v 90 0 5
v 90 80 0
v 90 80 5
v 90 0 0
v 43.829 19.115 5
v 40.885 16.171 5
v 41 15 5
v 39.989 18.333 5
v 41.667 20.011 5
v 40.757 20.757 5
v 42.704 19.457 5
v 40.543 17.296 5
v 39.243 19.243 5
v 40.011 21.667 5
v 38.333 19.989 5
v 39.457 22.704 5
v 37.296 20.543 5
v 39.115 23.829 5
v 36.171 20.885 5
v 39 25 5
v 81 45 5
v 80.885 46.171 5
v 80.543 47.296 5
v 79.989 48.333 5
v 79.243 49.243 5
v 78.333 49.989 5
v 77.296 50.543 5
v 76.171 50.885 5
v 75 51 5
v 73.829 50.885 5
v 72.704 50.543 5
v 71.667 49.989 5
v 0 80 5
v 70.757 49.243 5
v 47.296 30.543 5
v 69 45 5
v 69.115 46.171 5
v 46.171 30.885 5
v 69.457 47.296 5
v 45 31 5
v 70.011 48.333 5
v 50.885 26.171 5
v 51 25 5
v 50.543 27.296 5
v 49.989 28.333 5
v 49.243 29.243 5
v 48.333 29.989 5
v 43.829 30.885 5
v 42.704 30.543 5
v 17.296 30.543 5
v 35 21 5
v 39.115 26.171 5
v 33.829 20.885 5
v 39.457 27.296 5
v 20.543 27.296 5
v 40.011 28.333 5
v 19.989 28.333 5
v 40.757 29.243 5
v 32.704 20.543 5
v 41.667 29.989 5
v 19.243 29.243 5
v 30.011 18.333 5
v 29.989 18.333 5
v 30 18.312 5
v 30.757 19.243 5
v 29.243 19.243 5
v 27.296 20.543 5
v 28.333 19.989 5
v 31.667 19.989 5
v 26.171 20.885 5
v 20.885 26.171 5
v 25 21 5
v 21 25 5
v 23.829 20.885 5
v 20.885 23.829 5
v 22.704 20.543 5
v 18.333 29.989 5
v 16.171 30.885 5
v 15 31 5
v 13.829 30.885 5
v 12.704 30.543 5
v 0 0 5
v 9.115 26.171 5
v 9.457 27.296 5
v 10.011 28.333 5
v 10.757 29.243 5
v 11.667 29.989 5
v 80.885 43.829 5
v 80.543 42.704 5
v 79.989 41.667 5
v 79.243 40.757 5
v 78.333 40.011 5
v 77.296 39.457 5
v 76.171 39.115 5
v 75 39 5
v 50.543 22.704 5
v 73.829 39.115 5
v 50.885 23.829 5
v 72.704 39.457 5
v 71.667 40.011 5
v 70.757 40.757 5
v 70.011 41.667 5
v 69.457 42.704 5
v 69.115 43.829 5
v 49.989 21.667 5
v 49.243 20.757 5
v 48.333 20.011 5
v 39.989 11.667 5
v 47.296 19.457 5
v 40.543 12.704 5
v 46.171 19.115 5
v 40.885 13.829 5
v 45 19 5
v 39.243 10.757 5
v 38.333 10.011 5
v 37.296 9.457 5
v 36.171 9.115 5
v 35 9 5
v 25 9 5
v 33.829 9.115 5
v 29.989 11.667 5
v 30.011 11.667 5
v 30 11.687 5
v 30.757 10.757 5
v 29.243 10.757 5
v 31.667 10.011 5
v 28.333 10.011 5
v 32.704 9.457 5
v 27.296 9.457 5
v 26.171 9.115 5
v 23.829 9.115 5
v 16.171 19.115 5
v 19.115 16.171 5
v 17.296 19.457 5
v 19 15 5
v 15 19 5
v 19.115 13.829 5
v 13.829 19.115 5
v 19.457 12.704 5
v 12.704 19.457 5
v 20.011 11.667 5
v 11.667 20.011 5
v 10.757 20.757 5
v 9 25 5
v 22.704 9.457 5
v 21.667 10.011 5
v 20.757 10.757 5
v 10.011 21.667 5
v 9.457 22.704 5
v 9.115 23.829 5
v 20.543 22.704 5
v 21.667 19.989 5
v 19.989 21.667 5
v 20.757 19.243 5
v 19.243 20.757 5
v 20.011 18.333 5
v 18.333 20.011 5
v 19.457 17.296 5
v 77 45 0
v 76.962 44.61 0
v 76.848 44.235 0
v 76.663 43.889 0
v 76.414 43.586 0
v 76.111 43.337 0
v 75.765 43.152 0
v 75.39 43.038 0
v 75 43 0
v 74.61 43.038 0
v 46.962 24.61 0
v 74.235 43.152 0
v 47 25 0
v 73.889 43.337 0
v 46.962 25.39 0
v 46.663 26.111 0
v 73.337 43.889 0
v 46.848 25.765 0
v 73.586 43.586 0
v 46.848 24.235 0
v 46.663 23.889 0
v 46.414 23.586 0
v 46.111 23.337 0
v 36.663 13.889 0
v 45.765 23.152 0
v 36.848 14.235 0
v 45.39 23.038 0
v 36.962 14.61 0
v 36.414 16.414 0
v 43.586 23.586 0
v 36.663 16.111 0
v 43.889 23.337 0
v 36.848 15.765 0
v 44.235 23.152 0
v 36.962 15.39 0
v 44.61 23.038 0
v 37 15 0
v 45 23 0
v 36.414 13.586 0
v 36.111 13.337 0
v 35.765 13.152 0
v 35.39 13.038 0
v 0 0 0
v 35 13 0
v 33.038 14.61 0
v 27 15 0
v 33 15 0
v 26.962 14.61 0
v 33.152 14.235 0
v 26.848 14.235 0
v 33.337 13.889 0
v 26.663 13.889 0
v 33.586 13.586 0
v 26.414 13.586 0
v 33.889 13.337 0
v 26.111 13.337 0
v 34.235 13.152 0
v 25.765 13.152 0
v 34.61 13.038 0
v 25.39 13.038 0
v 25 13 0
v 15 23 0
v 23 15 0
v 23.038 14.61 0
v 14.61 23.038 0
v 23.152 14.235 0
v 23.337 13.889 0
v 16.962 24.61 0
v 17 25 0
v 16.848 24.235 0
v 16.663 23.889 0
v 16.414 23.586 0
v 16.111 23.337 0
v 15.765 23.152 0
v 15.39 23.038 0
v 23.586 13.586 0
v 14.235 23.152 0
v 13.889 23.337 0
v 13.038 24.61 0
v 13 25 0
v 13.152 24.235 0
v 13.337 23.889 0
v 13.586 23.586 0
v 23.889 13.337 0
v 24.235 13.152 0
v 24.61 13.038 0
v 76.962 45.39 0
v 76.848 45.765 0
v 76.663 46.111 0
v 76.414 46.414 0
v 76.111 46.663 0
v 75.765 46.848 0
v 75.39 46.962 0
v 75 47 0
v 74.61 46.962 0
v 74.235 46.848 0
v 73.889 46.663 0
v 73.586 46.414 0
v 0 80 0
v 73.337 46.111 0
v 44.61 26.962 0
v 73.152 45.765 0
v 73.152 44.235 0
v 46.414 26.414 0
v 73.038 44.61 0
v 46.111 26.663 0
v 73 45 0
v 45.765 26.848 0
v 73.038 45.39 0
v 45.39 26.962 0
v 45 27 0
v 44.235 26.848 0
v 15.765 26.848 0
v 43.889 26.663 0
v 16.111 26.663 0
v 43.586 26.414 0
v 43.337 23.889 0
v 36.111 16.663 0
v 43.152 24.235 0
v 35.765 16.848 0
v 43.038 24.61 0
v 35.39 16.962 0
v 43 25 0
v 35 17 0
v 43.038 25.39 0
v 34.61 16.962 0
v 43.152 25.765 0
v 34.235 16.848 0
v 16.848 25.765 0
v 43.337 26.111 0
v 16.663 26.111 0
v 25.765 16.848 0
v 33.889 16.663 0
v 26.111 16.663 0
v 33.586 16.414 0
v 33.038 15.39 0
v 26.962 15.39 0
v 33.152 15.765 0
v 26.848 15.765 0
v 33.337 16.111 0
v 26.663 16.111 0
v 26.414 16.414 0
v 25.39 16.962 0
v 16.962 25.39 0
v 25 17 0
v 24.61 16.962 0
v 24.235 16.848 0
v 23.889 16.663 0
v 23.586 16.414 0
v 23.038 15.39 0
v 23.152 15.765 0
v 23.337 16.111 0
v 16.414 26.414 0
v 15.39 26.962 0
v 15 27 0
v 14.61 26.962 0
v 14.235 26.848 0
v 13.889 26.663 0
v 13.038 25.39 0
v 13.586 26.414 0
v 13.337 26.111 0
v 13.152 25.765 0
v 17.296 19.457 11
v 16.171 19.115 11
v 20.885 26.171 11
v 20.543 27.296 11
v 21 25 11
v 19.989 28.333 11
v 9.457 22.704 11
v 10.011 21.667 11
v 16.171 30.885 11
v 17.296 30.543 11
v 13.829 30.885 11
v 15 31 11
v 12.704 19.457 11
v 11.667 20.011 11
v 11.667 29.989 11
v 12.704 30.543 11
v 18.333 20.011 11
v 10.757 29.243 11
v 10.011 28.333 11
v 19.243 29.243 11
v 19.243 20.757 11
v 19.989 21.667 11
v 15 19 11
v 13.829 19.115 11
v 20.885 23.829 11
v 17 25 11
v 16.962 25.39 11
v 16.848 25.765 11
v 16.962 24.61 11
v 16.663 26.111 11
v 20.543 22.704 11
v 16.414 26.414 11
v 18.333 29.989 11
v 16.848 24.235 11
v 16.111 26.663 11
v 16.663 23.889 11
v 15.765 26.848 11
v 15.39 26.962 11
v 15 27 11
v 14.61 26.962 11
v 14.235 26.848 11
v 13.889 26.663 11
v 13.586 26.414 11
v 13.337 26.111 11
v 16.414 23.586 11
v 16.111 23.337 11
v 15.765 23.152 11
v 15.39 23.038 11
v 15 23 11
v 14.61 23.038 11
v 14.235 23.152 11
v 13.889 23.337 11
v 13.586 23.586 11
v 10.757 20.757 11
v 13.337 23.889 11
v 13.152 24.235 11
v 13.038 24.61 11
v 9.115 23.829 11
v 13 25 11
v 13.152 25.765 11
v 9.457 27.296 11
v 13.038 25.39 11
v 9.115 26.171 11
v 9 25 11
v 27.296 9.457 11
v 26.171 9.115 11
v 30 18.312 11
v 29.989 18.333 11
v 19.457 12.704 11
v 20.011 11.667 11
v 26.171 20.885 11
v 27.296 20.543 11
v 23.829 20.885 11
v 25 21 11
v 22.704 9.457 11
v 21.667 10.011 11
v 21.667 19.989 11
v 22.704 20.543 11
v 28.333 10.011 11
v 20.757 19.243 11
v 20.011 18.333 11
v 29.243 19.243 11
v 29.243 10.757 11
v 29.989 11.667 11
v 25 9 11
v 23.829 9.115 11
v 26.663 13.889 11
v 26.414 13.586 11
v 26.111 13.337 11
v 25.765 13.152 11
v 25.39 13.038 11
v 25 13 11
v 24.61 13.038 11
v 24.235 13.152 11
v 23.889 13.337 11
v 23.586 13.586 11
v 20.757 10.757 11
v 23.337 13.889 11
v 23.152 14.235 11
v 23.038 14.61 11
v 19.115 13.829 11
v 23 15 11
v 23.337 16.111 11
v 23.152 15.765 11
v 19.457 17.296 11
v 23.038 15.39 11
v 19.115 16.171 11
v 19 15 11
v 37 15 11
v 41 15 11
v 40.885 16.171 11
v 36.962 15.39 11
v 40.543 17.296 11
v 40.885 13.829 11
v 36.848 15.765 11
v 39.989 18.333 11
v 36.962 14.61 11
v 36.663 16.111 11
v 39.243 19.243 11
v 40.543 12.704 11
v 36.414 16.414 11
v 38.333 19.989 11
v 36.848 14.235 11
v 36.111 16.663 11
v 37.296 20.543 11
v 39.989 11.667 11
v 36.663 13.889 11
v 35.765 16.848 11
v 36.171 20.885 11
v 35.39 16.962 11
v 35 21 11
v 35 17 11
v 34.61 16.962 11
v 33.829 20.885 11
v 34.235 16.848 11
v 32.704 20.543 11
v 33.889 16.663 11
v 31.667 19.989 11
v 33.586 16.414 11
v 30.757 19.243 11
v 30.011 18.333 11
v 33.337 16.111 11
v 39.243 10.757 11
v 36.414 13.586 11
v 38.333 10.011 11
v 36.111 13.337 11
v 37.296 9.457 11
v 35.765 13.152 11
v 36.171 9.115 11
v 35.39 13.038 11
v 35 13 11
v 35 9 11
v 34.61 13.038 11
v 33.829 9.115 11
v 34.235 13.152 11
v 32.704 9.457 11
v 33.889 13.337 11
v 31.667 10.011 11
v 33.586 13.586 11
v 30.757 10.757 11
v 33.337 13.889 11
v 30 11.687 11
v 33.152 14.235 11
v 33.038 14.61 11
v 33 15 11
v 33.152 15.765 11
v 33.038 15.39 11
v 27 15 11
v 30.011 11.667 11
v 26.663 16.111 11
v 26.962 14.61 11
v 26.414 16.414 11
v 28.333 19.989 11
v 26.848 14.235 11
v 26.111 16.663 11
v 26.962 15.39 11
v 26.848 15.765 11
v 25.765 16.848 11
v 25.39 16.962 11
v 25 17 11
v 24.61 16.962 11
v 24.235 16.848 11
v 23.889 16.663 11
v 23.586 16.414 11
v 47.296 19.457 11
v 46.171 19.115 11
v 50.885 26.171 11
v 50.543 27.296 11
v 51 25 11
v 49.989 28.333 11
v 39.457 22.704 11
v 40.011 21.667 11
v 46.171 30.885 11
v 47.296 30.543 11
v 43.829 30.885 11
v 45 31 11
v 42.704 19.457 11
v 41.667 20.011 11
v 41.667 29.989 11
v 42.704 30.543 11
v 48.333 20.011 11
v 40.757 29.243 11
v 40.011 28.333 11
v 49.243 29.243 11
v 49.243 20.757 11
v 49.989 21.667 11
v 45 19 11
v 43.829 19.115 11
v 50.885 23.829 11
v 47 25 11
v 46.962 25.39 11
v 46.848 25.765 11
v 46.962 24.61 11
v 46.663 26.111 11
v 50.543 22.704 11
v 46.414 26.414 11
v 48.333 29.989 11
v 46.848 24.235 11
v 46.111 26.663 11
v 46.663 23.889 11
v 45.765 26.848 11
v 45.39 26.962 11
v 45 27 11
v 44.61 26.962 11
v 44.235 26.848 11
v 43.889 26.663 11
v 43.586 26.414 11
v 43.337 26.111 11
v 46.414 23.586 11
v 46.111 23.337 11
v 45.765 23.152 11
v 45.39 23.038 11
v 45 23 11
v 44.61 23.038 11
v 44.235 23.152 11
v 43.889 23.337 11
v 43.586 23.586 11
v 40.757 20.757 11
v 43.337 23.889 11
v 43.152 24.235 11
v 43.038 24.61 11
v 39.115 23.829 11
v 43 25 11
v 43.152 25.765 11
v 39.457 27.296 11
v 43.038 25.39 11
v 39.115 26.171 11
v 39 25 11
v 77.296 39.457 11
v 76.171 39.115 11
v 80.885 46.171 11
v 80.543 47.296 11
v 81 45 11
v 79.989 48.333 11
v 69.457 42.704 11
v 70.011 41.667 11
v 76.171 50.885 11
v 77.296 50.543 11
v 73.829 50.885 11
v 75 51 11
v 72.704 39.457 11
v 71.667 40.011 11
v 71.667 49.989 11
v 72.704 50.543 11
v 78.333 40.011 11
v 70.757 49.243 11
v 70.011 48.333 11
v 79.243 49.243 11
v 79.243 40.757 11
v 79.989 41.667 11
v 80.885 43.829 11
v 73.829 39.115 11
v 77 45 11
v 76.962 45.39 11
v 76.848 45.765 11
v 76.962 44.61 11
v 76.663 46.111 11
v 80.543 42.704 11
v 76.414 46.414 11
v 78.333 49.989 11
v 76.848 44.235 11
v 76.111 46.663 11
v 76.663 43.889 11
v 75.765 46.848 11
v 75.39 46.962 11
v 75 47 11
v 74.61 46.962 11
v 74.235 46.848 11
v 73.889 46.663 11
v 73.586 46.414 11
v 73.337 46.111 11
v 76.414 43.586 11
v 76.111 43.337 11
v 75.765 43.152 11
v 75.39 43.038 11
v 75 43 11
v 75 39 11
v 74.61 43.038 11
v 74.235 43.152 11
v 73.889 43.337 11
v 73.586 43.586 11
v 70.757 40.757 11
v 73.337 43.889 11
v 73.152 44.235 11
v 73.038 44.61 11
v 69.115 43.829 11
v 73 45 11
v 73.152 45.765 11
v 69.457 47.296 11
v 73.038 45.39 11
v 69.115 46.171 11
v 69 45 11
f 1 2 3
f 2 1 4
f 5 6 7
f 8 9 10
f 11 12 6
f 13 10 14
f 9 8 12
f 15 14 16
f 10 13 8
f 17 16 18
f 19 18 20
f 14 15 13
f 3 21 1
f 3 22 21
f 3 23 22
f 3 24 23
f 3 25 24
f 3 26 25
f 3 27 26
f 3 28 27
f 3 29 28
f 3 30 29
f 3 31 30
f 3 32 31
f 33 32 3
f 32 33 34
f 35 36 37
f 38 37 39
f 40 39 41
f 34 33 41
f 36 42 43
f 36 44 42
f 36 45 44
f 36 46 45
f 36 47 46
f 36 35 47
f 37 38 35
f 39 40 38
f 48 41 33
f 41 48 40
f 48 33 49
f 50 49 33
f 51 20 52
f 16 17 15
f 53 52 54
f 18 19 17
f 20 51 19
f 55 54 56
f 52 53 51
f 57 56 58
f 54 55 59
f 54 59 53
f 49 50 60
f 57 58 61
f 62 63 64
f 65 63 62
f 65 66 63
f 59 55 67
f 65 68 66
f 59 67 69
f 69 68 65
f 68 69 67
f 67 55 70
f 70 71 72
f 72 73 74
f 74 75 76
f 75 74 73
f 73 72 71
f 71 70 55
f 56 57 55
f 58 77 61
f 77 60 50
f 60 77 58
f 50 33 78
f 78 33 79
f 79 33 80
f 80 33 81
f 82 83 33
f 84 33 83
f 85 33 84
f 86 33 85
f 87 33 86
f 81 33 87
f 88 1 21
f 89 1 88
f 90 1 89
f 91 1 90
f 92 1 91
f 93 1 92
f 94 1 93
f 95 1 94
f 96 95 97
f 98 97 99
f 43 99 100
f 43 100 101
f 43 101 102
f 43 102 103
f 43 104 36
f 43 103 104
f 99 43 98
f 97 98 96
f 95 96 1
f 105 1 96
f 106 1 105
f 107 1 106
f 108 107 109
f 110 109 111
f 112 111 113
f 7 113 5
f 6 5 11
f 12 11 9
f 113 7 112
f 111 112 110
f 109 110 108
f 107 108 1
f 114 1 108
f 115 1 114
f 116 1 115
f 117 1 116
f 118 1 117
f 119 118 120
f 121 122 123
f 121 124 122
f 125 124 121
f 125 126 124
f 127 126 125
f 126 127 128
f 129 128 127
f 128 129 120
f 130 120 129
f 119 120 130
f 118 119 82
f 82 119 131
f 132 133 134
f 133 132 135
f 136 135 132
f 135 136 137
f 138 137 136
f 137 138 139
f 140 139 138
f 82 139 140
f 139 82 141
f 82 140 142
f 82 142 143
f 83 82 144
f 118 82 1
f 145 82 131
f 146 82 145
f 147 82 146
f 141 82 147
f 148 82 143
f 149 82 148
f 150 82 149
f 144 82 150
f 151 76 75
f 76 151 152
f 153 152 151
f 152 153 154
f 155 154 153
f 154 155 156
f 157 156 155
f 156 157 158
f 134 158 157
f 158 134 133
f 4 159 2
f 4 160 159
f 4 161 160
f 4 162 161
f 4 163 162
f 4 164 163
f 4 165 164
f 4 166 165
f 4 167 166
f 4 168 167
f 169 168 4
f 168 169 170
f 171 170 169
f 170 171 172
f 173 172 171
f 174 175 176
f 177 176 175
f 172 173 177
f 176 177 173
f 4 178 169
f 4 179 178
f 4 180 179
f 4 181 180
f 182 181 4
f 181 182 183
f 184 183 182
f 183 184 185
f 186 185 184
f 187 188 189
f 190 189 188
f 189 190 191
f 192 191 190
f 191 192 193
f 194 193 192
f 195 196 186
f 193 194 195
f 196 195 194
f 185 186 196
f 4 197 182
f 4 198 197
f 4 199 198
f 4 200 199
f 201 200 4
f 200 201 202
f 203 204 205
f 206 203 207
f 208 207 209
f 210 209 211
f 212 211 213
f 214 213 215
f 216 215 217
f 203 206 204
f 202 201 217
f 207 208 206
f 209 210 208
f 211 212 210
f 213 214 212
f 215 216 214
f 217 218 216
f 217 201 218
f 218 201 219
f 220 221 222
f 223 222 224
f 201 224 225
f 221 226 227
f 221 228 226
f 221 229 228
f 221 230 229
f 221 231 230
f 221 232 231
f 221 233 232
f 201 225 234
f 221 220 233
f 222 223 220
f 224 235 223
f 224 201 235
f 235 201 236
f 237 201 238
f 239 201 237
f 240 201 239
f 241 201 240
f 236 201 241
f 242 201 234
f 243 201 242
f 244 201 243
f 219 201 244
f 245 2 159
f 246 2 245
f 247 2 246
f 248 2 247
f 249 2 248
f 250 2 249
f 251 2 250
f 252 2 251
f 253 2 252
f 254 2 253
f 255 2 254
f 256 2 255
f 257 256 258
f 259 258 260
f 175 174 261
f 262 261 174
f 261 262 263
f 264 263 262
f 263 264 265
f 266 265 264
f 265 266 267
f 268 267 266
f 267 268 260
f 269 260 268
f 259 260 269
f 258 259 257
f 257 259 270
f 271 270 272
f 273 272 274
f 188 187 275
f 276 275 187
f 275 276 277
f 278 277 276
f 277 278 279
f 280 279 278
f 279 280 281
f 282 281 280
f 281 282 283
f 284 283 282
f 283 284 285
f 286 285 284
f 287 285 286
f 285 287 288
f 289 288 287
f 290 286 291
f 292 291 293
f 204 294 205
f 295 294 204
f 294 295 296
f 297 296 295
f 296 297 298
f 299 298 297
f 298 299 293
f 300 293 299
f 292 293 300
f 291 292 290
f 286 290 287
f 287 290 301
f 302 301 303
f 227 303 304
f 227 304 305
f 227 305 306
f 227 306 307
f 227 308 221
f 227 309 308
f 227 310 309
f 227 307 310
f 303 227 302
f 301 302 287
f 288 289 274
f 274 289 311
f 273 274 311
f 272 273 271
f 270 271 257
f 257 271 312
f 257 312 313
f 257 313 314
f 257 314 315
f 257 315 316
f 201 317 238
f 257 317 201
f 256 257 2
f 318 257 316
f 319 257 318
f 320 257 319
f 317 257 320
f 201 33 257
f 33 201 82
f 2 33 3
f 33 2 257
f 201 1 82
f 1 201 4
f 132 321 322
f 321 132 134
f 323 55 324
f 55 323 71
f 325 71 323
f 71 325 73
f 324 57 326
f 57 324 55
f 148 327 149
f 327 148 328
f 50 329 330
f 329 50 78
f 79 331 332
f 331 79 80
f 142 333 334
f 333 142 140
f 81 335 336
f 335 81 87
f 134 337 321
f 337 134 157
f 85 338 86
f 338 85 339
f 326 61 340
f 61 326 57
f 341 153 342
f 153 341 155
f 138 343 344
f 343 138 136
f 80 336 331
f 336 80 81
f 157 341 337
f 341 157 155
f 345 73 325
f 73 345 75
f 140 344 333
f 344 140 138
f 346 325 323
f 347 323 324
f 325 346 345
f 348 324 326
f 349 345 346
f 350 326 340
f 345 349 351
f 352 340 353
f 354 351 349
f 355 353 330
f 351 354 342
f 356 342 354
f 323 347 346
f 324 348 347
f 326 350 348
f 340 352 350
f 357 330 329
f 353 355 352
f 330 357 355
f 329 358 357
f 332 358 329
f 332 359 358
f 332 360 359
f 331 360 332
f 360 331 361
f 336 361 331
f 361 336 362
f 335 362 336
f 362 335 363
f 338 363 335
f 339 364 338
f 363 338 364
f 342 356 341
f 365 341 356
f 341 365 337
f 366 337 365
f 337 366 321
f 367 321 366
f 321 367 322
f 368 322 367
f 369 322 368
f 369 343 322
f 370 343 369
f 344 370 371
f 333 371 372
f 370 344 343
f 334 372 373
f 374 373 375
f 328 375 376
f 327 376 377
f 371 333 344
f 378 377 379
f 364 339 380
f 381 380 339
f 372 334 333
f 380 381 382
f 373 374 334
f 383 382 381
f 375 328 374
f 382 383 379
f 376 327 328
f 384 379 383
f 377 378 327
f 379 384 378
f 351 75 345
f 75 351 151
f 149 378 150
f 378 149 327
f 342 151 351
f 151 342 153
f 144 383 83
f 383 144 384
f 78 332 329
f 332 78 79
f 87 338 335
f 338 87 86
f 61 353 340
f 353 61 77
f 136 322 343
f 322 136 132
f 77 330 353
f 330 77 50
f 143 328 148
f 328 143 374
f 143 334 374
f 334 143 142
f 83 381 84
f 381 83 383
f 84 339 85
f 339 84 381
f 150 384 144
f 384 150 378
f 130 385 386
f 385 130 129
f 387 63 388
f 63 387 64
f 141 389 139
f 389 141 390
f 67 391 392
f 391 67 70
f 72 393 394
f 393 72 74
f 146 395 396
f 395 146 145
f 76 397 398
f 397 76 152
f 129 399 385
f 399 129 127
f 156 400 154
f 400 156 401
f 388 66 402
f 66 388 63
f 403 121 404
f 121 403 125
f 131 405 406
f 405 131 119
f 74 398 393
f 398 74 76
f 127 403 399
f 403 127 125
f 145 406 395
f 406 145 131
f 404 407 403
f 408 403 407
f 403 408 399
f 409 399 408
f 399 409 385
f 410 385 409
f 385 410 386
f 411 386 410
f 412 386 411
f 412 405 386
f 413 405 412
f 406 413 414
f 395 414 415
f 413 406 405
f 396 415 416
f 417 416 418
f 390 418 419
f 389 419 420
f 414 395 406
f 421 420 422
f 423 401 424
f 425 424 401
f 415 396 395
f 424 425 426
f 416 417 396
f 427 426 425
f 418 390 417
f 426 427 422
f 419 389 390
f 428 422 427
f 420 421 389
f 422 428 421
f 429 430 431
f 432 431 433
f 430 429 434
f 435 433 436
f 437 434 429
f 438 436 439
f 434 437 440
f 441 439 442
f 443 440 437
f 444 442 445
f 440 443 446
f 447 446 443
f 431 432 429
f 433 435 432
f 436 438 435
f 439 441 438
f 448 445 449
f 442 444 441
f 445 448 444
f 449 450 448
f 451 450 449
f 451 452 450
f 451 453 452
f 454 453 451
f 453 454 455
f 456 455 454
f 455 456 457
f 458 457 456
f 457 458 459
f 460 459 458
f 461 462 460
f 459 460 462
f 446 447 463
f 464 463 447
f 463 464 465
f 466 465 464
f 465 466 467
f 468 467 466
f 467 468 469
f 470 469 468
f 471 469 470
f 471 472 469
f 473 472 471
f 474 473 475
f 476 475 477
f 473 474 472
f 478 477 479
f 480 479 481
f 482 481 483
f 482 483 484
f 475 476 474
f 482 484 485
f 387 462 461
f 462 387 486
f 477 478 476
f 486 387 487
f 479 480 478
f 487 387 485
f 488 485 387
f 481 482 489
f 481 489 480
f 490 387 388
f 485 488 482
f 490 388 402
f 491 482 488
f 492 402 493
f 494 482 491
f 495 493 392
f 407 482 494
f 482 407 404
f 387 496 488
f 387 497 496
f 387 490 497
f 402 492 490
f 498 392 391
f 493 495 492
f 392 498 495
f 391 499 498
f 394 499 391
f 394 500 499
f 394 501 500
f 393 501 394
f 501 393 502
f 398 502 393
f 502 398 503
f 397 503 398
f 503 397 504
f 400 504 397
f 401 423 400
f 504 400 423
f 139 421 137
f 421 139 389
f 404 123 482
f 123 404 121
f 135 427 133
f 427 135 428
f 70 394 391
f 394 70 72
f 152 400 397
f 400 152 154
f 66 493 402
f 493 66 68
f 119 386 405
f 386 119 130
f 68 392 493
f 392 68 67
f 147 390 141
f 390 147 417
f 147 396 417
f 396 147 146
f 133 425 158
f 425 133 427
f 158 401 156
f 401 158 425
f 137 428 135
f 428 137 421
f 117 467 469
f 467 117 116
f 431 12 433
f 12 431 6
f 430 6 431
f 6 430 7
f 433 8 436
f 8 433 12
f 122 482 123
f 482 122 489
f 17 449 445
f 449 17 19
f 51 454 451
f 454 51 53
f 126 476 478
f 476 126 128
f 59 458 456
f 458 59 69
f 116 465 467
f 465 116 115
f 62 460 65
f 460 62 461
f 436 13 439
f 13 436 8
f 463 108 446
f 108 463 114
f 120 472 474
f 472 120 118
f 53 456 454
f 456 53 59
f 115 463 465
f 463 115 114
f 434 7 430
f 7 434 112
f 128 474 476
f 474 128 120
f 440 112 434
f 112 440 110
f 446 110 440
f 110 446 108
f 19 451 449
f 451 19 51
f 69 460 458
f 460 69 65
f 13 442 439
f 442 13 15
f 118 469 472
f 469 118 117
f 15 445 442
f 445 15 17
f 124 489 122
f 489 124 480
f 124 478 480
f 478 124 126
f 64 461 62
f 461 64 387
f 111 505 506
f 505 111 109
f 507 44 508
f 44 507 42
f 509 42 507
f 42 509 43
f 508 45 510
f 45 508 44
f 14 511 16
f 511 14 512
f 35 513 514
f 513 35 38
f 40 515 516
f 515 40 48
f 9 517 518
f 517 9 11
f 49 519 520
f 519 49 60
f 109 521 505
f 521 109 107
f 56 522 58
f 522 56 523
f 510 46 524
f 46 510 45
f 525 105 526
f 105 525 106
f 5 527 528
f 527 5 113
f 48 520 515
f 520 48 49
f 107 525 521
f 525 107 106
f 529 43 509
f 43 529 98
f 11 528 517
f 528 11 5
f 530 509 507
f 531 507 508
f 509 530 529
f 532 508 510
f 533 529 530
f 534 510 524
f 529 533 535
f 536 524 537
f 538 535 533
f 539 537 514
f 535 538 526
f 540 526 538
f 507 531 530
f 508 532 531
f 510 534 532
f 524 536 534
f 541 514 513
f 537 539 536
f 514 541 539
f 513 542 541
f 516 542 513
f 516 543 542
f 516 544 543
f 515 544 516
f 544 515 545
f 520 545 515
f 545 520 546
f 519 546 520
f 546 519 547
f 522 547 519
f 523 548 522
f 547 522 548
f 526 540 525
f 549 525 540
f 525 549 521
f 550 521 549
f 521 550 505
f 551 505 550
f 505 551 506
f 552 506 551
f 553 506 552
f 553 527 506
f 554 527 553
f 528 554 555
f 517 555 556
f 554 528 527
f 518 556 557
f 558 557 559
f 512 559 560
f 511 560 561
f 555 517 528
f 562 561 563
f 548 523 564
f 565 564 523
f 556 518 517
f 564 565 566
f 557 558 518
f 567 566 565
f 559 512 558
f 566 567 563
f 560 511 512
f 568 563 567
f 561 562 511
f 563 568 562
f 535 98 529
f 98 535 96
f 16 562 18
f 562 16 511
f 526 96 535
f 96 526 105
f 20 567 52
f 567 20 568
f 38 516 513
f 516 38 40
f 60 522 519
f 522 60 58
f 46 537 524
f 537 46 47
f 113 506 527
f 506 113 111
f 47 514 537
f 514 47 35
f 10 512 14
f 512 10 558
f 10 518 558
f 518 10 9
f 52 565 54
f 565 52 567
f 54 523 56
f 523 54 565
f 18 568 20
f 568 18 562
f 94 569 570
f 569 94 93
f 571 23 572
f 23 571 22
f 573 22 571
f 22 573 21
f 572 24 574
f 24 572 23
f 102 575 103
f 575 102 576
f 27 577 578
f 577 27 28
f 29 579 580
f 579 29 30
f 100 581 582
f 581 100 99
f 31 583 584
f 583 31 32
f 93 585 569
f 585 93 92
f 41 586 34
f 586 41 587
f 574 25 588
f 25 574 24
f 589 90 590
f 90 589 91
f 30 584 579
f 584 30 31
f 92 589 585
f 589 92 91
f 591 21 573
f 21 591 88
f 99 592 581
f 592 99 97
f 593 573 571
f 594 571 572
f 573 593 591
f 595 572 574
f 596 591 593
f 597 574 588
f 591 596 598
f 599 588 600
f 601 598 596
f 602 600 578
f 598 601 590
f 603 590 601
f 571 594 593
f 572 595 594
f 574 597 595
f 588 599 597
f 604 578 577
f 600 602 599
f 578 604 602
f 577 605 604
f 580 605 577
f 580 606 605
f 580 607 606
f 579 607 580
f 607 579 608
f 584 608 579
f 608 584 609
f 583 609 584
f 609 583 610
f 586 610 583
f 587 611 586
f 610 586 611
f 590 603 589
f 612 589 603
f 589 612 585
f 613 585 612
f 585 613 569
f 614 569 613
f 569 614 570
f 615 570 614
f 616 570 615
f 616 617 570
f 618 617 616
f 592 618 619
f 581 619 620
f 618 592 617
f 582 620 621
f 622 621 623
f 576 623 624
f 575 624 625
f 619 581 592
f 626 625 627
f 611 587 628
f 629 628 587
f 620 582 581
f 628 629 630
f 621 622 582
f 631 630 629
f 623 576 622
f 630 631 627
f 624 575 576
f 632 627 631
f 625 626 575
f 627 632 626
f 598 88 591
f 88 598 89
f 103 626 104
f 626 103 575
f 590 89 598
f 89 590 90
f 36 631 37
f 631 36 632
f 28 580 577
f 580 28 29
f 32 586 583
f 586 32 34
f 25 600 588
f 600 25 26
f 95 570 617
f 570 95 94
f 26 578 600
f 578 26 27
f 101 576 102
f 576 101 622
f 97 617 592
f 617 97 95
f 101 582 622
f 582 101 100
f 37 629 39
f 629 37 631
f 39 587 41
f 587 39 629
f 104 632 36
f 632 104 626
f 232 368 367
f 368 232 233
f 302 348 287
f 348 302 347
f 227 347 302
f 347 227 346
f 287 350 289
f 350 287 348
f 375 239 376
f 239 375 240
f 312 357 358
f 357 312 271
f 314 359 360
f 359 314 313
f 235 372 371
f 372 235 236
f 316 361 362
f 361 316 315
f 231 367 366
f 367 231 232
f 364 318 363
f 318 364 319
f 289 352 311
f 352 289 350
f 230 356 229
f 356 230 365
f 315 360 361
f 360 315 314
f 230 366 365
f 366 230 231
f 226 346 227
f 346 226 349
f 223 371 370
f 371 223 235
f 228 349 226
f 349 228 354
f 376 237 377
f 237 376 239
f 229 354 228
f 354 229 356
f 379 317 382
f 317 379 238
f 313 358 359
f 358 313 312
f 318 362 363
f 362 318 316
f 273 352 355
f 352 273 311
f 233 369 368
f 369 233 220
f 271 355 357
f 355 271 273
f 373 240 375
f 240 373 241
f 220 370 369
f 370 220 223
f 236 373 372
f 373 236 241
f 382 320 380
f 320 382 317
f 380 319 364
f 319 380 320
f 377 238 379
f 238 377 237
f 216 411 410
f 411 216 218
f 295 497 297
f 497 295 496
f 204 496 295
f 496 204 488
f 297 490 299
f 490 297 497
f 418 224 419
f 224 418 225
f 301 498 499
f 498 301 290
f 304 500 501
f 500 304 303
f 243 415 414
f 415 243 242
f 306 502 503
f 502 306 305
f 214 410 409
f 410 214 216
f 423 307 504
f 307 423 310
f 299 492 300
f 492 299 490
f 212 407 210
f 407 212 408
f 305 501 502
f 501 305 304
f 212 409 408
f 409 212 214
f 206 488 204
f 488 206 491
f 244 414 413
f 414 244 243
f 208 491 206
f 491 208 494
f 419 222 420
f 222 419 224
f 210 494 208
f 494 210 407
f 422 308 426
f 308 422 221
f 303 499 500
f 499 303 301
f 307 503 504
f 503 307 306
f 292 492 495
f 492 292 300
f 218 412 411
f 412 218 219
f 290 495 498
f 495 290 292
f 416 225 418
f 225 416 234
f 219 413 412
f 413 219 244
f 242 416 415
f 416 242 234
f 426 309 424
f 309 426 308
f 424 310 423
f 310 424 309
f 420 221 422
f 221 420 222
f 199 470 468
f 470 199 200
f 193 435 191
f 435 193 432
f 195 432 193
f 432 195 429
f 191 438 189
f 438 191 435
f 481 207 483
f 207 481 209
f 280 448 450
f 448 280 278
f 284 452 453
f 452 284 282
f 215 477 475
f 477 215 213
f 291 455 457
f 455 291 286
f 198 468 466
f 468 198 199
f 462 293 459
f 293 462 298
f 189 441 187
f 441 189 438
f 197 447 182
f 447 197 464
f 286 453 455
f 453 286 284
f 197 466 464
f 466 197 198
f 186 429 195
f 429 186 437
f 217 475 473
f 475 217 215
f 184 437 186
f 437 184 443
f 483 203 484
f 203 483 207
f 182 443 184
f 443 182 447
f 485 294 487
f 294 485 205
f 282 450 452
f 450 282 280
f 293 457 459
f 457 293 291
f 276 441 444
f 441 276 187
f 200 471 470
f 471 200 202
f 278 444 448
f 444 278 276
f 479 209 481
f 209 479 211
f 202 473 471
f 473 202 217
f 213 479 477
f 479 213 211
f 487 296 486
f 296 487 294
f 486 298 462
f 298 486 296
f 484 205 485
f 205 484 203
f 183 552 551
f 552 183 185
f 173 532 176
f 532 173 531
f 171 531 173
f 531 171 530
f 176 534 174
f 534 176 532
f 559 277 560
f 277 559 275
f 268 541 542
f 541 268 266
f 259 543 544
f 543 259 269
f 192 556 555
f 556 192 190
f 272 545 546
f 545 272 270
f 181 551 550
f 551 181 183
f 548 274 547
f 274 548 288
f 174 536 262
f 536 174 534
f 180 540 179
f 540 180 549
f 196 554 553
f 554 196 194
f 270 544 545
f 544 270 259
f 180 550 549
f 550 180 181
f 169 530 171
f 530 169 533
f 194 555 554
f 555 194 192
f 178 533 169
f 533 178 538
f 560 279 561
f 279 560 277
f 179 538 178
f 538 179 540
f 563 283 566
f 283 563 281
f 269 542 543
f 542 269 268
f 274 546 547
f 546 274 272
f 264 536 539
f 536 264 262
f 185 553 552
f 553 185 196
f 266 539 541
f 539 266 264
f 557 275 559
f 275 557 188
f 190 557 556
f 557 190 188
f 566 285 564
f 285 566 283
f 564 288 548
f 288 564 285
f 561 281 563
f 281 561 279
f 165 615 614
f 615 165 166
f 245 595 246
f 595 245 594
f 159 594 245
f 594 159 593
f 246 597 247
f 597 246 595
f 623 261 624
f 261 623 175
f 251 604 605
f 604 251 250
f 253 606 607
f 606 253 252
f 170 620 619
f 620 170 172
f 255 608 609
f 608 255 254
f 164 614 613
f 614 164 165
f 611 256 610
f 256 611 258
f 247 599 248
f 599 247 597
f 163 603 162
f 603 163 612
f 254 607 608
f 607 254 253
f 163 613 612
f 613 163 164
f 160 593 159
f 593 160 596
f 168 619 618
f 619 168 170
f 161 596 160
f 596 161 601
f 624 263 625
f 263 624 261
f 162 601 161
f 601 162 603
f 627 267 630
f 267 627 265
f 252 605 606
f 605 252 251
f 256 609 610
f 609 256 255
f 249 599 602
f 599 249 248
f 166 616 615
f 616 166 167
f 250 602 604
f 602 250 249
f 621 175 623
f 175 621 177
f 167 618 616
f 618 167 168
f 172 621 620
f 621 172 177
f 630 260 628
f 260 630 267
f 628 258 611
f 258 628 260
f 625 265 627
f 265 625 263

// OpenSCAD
$fn = 32;

// ----------------------------------------------------------------------
// Boss field: plate with bosses at given coordinates
// ----------------------------------------------------------------------

// --- parameters (mm) ---
plate_l = 90;             // plate length, X
plate_w = 80;             // plate width, Y
plate_t = 5;              // plate thickness, Z
boss_d = 12;              // boss diameter
boss_h = 6;               // boss height above the plate
bore_d = 4;               // boss bore
fit_tol = 0.1;            // tolerance for press fits, mm
free_tol = 0.3;           // tolerance for clearance fits, mm

total_h = plate_t + boss_h;  // overall height

difference() {
  union() {
    cube([plate_l, plate_w, plate_t]);
    translate([15, 25, plate_t]) cylinder(h = boss_h, d = boss_d);
    translate([25, 15, plate_t]) cylinder(h = boss_h, d = boss_d);
    translate([35, 15, plate_t]) cylinder(h = boss_h, d = boss_d);
    translate([45, 25, plate_t]) cylinder(h = boss_h, d = boss_d);
    translate([75, 45, plate_t]) cylinder(h = boss_h, d = boss_d);
  }
  translate([15, 25, -1]) cylinder(h = total_h + 2, d = bore_d);
  translate([25, 15, -1]) cylinder(h = total_h + 2, d = bore_d);
  translate([35, 15, -1]) cylinder(h = total_h + 2, d = bore_d);
  translate([45, 25, -1]) cylinder(h = total_h + 2, d = bore_d);
  translate([75, 45, -1]) cylinder(h = total_h + 2, d = bore_d);
}
